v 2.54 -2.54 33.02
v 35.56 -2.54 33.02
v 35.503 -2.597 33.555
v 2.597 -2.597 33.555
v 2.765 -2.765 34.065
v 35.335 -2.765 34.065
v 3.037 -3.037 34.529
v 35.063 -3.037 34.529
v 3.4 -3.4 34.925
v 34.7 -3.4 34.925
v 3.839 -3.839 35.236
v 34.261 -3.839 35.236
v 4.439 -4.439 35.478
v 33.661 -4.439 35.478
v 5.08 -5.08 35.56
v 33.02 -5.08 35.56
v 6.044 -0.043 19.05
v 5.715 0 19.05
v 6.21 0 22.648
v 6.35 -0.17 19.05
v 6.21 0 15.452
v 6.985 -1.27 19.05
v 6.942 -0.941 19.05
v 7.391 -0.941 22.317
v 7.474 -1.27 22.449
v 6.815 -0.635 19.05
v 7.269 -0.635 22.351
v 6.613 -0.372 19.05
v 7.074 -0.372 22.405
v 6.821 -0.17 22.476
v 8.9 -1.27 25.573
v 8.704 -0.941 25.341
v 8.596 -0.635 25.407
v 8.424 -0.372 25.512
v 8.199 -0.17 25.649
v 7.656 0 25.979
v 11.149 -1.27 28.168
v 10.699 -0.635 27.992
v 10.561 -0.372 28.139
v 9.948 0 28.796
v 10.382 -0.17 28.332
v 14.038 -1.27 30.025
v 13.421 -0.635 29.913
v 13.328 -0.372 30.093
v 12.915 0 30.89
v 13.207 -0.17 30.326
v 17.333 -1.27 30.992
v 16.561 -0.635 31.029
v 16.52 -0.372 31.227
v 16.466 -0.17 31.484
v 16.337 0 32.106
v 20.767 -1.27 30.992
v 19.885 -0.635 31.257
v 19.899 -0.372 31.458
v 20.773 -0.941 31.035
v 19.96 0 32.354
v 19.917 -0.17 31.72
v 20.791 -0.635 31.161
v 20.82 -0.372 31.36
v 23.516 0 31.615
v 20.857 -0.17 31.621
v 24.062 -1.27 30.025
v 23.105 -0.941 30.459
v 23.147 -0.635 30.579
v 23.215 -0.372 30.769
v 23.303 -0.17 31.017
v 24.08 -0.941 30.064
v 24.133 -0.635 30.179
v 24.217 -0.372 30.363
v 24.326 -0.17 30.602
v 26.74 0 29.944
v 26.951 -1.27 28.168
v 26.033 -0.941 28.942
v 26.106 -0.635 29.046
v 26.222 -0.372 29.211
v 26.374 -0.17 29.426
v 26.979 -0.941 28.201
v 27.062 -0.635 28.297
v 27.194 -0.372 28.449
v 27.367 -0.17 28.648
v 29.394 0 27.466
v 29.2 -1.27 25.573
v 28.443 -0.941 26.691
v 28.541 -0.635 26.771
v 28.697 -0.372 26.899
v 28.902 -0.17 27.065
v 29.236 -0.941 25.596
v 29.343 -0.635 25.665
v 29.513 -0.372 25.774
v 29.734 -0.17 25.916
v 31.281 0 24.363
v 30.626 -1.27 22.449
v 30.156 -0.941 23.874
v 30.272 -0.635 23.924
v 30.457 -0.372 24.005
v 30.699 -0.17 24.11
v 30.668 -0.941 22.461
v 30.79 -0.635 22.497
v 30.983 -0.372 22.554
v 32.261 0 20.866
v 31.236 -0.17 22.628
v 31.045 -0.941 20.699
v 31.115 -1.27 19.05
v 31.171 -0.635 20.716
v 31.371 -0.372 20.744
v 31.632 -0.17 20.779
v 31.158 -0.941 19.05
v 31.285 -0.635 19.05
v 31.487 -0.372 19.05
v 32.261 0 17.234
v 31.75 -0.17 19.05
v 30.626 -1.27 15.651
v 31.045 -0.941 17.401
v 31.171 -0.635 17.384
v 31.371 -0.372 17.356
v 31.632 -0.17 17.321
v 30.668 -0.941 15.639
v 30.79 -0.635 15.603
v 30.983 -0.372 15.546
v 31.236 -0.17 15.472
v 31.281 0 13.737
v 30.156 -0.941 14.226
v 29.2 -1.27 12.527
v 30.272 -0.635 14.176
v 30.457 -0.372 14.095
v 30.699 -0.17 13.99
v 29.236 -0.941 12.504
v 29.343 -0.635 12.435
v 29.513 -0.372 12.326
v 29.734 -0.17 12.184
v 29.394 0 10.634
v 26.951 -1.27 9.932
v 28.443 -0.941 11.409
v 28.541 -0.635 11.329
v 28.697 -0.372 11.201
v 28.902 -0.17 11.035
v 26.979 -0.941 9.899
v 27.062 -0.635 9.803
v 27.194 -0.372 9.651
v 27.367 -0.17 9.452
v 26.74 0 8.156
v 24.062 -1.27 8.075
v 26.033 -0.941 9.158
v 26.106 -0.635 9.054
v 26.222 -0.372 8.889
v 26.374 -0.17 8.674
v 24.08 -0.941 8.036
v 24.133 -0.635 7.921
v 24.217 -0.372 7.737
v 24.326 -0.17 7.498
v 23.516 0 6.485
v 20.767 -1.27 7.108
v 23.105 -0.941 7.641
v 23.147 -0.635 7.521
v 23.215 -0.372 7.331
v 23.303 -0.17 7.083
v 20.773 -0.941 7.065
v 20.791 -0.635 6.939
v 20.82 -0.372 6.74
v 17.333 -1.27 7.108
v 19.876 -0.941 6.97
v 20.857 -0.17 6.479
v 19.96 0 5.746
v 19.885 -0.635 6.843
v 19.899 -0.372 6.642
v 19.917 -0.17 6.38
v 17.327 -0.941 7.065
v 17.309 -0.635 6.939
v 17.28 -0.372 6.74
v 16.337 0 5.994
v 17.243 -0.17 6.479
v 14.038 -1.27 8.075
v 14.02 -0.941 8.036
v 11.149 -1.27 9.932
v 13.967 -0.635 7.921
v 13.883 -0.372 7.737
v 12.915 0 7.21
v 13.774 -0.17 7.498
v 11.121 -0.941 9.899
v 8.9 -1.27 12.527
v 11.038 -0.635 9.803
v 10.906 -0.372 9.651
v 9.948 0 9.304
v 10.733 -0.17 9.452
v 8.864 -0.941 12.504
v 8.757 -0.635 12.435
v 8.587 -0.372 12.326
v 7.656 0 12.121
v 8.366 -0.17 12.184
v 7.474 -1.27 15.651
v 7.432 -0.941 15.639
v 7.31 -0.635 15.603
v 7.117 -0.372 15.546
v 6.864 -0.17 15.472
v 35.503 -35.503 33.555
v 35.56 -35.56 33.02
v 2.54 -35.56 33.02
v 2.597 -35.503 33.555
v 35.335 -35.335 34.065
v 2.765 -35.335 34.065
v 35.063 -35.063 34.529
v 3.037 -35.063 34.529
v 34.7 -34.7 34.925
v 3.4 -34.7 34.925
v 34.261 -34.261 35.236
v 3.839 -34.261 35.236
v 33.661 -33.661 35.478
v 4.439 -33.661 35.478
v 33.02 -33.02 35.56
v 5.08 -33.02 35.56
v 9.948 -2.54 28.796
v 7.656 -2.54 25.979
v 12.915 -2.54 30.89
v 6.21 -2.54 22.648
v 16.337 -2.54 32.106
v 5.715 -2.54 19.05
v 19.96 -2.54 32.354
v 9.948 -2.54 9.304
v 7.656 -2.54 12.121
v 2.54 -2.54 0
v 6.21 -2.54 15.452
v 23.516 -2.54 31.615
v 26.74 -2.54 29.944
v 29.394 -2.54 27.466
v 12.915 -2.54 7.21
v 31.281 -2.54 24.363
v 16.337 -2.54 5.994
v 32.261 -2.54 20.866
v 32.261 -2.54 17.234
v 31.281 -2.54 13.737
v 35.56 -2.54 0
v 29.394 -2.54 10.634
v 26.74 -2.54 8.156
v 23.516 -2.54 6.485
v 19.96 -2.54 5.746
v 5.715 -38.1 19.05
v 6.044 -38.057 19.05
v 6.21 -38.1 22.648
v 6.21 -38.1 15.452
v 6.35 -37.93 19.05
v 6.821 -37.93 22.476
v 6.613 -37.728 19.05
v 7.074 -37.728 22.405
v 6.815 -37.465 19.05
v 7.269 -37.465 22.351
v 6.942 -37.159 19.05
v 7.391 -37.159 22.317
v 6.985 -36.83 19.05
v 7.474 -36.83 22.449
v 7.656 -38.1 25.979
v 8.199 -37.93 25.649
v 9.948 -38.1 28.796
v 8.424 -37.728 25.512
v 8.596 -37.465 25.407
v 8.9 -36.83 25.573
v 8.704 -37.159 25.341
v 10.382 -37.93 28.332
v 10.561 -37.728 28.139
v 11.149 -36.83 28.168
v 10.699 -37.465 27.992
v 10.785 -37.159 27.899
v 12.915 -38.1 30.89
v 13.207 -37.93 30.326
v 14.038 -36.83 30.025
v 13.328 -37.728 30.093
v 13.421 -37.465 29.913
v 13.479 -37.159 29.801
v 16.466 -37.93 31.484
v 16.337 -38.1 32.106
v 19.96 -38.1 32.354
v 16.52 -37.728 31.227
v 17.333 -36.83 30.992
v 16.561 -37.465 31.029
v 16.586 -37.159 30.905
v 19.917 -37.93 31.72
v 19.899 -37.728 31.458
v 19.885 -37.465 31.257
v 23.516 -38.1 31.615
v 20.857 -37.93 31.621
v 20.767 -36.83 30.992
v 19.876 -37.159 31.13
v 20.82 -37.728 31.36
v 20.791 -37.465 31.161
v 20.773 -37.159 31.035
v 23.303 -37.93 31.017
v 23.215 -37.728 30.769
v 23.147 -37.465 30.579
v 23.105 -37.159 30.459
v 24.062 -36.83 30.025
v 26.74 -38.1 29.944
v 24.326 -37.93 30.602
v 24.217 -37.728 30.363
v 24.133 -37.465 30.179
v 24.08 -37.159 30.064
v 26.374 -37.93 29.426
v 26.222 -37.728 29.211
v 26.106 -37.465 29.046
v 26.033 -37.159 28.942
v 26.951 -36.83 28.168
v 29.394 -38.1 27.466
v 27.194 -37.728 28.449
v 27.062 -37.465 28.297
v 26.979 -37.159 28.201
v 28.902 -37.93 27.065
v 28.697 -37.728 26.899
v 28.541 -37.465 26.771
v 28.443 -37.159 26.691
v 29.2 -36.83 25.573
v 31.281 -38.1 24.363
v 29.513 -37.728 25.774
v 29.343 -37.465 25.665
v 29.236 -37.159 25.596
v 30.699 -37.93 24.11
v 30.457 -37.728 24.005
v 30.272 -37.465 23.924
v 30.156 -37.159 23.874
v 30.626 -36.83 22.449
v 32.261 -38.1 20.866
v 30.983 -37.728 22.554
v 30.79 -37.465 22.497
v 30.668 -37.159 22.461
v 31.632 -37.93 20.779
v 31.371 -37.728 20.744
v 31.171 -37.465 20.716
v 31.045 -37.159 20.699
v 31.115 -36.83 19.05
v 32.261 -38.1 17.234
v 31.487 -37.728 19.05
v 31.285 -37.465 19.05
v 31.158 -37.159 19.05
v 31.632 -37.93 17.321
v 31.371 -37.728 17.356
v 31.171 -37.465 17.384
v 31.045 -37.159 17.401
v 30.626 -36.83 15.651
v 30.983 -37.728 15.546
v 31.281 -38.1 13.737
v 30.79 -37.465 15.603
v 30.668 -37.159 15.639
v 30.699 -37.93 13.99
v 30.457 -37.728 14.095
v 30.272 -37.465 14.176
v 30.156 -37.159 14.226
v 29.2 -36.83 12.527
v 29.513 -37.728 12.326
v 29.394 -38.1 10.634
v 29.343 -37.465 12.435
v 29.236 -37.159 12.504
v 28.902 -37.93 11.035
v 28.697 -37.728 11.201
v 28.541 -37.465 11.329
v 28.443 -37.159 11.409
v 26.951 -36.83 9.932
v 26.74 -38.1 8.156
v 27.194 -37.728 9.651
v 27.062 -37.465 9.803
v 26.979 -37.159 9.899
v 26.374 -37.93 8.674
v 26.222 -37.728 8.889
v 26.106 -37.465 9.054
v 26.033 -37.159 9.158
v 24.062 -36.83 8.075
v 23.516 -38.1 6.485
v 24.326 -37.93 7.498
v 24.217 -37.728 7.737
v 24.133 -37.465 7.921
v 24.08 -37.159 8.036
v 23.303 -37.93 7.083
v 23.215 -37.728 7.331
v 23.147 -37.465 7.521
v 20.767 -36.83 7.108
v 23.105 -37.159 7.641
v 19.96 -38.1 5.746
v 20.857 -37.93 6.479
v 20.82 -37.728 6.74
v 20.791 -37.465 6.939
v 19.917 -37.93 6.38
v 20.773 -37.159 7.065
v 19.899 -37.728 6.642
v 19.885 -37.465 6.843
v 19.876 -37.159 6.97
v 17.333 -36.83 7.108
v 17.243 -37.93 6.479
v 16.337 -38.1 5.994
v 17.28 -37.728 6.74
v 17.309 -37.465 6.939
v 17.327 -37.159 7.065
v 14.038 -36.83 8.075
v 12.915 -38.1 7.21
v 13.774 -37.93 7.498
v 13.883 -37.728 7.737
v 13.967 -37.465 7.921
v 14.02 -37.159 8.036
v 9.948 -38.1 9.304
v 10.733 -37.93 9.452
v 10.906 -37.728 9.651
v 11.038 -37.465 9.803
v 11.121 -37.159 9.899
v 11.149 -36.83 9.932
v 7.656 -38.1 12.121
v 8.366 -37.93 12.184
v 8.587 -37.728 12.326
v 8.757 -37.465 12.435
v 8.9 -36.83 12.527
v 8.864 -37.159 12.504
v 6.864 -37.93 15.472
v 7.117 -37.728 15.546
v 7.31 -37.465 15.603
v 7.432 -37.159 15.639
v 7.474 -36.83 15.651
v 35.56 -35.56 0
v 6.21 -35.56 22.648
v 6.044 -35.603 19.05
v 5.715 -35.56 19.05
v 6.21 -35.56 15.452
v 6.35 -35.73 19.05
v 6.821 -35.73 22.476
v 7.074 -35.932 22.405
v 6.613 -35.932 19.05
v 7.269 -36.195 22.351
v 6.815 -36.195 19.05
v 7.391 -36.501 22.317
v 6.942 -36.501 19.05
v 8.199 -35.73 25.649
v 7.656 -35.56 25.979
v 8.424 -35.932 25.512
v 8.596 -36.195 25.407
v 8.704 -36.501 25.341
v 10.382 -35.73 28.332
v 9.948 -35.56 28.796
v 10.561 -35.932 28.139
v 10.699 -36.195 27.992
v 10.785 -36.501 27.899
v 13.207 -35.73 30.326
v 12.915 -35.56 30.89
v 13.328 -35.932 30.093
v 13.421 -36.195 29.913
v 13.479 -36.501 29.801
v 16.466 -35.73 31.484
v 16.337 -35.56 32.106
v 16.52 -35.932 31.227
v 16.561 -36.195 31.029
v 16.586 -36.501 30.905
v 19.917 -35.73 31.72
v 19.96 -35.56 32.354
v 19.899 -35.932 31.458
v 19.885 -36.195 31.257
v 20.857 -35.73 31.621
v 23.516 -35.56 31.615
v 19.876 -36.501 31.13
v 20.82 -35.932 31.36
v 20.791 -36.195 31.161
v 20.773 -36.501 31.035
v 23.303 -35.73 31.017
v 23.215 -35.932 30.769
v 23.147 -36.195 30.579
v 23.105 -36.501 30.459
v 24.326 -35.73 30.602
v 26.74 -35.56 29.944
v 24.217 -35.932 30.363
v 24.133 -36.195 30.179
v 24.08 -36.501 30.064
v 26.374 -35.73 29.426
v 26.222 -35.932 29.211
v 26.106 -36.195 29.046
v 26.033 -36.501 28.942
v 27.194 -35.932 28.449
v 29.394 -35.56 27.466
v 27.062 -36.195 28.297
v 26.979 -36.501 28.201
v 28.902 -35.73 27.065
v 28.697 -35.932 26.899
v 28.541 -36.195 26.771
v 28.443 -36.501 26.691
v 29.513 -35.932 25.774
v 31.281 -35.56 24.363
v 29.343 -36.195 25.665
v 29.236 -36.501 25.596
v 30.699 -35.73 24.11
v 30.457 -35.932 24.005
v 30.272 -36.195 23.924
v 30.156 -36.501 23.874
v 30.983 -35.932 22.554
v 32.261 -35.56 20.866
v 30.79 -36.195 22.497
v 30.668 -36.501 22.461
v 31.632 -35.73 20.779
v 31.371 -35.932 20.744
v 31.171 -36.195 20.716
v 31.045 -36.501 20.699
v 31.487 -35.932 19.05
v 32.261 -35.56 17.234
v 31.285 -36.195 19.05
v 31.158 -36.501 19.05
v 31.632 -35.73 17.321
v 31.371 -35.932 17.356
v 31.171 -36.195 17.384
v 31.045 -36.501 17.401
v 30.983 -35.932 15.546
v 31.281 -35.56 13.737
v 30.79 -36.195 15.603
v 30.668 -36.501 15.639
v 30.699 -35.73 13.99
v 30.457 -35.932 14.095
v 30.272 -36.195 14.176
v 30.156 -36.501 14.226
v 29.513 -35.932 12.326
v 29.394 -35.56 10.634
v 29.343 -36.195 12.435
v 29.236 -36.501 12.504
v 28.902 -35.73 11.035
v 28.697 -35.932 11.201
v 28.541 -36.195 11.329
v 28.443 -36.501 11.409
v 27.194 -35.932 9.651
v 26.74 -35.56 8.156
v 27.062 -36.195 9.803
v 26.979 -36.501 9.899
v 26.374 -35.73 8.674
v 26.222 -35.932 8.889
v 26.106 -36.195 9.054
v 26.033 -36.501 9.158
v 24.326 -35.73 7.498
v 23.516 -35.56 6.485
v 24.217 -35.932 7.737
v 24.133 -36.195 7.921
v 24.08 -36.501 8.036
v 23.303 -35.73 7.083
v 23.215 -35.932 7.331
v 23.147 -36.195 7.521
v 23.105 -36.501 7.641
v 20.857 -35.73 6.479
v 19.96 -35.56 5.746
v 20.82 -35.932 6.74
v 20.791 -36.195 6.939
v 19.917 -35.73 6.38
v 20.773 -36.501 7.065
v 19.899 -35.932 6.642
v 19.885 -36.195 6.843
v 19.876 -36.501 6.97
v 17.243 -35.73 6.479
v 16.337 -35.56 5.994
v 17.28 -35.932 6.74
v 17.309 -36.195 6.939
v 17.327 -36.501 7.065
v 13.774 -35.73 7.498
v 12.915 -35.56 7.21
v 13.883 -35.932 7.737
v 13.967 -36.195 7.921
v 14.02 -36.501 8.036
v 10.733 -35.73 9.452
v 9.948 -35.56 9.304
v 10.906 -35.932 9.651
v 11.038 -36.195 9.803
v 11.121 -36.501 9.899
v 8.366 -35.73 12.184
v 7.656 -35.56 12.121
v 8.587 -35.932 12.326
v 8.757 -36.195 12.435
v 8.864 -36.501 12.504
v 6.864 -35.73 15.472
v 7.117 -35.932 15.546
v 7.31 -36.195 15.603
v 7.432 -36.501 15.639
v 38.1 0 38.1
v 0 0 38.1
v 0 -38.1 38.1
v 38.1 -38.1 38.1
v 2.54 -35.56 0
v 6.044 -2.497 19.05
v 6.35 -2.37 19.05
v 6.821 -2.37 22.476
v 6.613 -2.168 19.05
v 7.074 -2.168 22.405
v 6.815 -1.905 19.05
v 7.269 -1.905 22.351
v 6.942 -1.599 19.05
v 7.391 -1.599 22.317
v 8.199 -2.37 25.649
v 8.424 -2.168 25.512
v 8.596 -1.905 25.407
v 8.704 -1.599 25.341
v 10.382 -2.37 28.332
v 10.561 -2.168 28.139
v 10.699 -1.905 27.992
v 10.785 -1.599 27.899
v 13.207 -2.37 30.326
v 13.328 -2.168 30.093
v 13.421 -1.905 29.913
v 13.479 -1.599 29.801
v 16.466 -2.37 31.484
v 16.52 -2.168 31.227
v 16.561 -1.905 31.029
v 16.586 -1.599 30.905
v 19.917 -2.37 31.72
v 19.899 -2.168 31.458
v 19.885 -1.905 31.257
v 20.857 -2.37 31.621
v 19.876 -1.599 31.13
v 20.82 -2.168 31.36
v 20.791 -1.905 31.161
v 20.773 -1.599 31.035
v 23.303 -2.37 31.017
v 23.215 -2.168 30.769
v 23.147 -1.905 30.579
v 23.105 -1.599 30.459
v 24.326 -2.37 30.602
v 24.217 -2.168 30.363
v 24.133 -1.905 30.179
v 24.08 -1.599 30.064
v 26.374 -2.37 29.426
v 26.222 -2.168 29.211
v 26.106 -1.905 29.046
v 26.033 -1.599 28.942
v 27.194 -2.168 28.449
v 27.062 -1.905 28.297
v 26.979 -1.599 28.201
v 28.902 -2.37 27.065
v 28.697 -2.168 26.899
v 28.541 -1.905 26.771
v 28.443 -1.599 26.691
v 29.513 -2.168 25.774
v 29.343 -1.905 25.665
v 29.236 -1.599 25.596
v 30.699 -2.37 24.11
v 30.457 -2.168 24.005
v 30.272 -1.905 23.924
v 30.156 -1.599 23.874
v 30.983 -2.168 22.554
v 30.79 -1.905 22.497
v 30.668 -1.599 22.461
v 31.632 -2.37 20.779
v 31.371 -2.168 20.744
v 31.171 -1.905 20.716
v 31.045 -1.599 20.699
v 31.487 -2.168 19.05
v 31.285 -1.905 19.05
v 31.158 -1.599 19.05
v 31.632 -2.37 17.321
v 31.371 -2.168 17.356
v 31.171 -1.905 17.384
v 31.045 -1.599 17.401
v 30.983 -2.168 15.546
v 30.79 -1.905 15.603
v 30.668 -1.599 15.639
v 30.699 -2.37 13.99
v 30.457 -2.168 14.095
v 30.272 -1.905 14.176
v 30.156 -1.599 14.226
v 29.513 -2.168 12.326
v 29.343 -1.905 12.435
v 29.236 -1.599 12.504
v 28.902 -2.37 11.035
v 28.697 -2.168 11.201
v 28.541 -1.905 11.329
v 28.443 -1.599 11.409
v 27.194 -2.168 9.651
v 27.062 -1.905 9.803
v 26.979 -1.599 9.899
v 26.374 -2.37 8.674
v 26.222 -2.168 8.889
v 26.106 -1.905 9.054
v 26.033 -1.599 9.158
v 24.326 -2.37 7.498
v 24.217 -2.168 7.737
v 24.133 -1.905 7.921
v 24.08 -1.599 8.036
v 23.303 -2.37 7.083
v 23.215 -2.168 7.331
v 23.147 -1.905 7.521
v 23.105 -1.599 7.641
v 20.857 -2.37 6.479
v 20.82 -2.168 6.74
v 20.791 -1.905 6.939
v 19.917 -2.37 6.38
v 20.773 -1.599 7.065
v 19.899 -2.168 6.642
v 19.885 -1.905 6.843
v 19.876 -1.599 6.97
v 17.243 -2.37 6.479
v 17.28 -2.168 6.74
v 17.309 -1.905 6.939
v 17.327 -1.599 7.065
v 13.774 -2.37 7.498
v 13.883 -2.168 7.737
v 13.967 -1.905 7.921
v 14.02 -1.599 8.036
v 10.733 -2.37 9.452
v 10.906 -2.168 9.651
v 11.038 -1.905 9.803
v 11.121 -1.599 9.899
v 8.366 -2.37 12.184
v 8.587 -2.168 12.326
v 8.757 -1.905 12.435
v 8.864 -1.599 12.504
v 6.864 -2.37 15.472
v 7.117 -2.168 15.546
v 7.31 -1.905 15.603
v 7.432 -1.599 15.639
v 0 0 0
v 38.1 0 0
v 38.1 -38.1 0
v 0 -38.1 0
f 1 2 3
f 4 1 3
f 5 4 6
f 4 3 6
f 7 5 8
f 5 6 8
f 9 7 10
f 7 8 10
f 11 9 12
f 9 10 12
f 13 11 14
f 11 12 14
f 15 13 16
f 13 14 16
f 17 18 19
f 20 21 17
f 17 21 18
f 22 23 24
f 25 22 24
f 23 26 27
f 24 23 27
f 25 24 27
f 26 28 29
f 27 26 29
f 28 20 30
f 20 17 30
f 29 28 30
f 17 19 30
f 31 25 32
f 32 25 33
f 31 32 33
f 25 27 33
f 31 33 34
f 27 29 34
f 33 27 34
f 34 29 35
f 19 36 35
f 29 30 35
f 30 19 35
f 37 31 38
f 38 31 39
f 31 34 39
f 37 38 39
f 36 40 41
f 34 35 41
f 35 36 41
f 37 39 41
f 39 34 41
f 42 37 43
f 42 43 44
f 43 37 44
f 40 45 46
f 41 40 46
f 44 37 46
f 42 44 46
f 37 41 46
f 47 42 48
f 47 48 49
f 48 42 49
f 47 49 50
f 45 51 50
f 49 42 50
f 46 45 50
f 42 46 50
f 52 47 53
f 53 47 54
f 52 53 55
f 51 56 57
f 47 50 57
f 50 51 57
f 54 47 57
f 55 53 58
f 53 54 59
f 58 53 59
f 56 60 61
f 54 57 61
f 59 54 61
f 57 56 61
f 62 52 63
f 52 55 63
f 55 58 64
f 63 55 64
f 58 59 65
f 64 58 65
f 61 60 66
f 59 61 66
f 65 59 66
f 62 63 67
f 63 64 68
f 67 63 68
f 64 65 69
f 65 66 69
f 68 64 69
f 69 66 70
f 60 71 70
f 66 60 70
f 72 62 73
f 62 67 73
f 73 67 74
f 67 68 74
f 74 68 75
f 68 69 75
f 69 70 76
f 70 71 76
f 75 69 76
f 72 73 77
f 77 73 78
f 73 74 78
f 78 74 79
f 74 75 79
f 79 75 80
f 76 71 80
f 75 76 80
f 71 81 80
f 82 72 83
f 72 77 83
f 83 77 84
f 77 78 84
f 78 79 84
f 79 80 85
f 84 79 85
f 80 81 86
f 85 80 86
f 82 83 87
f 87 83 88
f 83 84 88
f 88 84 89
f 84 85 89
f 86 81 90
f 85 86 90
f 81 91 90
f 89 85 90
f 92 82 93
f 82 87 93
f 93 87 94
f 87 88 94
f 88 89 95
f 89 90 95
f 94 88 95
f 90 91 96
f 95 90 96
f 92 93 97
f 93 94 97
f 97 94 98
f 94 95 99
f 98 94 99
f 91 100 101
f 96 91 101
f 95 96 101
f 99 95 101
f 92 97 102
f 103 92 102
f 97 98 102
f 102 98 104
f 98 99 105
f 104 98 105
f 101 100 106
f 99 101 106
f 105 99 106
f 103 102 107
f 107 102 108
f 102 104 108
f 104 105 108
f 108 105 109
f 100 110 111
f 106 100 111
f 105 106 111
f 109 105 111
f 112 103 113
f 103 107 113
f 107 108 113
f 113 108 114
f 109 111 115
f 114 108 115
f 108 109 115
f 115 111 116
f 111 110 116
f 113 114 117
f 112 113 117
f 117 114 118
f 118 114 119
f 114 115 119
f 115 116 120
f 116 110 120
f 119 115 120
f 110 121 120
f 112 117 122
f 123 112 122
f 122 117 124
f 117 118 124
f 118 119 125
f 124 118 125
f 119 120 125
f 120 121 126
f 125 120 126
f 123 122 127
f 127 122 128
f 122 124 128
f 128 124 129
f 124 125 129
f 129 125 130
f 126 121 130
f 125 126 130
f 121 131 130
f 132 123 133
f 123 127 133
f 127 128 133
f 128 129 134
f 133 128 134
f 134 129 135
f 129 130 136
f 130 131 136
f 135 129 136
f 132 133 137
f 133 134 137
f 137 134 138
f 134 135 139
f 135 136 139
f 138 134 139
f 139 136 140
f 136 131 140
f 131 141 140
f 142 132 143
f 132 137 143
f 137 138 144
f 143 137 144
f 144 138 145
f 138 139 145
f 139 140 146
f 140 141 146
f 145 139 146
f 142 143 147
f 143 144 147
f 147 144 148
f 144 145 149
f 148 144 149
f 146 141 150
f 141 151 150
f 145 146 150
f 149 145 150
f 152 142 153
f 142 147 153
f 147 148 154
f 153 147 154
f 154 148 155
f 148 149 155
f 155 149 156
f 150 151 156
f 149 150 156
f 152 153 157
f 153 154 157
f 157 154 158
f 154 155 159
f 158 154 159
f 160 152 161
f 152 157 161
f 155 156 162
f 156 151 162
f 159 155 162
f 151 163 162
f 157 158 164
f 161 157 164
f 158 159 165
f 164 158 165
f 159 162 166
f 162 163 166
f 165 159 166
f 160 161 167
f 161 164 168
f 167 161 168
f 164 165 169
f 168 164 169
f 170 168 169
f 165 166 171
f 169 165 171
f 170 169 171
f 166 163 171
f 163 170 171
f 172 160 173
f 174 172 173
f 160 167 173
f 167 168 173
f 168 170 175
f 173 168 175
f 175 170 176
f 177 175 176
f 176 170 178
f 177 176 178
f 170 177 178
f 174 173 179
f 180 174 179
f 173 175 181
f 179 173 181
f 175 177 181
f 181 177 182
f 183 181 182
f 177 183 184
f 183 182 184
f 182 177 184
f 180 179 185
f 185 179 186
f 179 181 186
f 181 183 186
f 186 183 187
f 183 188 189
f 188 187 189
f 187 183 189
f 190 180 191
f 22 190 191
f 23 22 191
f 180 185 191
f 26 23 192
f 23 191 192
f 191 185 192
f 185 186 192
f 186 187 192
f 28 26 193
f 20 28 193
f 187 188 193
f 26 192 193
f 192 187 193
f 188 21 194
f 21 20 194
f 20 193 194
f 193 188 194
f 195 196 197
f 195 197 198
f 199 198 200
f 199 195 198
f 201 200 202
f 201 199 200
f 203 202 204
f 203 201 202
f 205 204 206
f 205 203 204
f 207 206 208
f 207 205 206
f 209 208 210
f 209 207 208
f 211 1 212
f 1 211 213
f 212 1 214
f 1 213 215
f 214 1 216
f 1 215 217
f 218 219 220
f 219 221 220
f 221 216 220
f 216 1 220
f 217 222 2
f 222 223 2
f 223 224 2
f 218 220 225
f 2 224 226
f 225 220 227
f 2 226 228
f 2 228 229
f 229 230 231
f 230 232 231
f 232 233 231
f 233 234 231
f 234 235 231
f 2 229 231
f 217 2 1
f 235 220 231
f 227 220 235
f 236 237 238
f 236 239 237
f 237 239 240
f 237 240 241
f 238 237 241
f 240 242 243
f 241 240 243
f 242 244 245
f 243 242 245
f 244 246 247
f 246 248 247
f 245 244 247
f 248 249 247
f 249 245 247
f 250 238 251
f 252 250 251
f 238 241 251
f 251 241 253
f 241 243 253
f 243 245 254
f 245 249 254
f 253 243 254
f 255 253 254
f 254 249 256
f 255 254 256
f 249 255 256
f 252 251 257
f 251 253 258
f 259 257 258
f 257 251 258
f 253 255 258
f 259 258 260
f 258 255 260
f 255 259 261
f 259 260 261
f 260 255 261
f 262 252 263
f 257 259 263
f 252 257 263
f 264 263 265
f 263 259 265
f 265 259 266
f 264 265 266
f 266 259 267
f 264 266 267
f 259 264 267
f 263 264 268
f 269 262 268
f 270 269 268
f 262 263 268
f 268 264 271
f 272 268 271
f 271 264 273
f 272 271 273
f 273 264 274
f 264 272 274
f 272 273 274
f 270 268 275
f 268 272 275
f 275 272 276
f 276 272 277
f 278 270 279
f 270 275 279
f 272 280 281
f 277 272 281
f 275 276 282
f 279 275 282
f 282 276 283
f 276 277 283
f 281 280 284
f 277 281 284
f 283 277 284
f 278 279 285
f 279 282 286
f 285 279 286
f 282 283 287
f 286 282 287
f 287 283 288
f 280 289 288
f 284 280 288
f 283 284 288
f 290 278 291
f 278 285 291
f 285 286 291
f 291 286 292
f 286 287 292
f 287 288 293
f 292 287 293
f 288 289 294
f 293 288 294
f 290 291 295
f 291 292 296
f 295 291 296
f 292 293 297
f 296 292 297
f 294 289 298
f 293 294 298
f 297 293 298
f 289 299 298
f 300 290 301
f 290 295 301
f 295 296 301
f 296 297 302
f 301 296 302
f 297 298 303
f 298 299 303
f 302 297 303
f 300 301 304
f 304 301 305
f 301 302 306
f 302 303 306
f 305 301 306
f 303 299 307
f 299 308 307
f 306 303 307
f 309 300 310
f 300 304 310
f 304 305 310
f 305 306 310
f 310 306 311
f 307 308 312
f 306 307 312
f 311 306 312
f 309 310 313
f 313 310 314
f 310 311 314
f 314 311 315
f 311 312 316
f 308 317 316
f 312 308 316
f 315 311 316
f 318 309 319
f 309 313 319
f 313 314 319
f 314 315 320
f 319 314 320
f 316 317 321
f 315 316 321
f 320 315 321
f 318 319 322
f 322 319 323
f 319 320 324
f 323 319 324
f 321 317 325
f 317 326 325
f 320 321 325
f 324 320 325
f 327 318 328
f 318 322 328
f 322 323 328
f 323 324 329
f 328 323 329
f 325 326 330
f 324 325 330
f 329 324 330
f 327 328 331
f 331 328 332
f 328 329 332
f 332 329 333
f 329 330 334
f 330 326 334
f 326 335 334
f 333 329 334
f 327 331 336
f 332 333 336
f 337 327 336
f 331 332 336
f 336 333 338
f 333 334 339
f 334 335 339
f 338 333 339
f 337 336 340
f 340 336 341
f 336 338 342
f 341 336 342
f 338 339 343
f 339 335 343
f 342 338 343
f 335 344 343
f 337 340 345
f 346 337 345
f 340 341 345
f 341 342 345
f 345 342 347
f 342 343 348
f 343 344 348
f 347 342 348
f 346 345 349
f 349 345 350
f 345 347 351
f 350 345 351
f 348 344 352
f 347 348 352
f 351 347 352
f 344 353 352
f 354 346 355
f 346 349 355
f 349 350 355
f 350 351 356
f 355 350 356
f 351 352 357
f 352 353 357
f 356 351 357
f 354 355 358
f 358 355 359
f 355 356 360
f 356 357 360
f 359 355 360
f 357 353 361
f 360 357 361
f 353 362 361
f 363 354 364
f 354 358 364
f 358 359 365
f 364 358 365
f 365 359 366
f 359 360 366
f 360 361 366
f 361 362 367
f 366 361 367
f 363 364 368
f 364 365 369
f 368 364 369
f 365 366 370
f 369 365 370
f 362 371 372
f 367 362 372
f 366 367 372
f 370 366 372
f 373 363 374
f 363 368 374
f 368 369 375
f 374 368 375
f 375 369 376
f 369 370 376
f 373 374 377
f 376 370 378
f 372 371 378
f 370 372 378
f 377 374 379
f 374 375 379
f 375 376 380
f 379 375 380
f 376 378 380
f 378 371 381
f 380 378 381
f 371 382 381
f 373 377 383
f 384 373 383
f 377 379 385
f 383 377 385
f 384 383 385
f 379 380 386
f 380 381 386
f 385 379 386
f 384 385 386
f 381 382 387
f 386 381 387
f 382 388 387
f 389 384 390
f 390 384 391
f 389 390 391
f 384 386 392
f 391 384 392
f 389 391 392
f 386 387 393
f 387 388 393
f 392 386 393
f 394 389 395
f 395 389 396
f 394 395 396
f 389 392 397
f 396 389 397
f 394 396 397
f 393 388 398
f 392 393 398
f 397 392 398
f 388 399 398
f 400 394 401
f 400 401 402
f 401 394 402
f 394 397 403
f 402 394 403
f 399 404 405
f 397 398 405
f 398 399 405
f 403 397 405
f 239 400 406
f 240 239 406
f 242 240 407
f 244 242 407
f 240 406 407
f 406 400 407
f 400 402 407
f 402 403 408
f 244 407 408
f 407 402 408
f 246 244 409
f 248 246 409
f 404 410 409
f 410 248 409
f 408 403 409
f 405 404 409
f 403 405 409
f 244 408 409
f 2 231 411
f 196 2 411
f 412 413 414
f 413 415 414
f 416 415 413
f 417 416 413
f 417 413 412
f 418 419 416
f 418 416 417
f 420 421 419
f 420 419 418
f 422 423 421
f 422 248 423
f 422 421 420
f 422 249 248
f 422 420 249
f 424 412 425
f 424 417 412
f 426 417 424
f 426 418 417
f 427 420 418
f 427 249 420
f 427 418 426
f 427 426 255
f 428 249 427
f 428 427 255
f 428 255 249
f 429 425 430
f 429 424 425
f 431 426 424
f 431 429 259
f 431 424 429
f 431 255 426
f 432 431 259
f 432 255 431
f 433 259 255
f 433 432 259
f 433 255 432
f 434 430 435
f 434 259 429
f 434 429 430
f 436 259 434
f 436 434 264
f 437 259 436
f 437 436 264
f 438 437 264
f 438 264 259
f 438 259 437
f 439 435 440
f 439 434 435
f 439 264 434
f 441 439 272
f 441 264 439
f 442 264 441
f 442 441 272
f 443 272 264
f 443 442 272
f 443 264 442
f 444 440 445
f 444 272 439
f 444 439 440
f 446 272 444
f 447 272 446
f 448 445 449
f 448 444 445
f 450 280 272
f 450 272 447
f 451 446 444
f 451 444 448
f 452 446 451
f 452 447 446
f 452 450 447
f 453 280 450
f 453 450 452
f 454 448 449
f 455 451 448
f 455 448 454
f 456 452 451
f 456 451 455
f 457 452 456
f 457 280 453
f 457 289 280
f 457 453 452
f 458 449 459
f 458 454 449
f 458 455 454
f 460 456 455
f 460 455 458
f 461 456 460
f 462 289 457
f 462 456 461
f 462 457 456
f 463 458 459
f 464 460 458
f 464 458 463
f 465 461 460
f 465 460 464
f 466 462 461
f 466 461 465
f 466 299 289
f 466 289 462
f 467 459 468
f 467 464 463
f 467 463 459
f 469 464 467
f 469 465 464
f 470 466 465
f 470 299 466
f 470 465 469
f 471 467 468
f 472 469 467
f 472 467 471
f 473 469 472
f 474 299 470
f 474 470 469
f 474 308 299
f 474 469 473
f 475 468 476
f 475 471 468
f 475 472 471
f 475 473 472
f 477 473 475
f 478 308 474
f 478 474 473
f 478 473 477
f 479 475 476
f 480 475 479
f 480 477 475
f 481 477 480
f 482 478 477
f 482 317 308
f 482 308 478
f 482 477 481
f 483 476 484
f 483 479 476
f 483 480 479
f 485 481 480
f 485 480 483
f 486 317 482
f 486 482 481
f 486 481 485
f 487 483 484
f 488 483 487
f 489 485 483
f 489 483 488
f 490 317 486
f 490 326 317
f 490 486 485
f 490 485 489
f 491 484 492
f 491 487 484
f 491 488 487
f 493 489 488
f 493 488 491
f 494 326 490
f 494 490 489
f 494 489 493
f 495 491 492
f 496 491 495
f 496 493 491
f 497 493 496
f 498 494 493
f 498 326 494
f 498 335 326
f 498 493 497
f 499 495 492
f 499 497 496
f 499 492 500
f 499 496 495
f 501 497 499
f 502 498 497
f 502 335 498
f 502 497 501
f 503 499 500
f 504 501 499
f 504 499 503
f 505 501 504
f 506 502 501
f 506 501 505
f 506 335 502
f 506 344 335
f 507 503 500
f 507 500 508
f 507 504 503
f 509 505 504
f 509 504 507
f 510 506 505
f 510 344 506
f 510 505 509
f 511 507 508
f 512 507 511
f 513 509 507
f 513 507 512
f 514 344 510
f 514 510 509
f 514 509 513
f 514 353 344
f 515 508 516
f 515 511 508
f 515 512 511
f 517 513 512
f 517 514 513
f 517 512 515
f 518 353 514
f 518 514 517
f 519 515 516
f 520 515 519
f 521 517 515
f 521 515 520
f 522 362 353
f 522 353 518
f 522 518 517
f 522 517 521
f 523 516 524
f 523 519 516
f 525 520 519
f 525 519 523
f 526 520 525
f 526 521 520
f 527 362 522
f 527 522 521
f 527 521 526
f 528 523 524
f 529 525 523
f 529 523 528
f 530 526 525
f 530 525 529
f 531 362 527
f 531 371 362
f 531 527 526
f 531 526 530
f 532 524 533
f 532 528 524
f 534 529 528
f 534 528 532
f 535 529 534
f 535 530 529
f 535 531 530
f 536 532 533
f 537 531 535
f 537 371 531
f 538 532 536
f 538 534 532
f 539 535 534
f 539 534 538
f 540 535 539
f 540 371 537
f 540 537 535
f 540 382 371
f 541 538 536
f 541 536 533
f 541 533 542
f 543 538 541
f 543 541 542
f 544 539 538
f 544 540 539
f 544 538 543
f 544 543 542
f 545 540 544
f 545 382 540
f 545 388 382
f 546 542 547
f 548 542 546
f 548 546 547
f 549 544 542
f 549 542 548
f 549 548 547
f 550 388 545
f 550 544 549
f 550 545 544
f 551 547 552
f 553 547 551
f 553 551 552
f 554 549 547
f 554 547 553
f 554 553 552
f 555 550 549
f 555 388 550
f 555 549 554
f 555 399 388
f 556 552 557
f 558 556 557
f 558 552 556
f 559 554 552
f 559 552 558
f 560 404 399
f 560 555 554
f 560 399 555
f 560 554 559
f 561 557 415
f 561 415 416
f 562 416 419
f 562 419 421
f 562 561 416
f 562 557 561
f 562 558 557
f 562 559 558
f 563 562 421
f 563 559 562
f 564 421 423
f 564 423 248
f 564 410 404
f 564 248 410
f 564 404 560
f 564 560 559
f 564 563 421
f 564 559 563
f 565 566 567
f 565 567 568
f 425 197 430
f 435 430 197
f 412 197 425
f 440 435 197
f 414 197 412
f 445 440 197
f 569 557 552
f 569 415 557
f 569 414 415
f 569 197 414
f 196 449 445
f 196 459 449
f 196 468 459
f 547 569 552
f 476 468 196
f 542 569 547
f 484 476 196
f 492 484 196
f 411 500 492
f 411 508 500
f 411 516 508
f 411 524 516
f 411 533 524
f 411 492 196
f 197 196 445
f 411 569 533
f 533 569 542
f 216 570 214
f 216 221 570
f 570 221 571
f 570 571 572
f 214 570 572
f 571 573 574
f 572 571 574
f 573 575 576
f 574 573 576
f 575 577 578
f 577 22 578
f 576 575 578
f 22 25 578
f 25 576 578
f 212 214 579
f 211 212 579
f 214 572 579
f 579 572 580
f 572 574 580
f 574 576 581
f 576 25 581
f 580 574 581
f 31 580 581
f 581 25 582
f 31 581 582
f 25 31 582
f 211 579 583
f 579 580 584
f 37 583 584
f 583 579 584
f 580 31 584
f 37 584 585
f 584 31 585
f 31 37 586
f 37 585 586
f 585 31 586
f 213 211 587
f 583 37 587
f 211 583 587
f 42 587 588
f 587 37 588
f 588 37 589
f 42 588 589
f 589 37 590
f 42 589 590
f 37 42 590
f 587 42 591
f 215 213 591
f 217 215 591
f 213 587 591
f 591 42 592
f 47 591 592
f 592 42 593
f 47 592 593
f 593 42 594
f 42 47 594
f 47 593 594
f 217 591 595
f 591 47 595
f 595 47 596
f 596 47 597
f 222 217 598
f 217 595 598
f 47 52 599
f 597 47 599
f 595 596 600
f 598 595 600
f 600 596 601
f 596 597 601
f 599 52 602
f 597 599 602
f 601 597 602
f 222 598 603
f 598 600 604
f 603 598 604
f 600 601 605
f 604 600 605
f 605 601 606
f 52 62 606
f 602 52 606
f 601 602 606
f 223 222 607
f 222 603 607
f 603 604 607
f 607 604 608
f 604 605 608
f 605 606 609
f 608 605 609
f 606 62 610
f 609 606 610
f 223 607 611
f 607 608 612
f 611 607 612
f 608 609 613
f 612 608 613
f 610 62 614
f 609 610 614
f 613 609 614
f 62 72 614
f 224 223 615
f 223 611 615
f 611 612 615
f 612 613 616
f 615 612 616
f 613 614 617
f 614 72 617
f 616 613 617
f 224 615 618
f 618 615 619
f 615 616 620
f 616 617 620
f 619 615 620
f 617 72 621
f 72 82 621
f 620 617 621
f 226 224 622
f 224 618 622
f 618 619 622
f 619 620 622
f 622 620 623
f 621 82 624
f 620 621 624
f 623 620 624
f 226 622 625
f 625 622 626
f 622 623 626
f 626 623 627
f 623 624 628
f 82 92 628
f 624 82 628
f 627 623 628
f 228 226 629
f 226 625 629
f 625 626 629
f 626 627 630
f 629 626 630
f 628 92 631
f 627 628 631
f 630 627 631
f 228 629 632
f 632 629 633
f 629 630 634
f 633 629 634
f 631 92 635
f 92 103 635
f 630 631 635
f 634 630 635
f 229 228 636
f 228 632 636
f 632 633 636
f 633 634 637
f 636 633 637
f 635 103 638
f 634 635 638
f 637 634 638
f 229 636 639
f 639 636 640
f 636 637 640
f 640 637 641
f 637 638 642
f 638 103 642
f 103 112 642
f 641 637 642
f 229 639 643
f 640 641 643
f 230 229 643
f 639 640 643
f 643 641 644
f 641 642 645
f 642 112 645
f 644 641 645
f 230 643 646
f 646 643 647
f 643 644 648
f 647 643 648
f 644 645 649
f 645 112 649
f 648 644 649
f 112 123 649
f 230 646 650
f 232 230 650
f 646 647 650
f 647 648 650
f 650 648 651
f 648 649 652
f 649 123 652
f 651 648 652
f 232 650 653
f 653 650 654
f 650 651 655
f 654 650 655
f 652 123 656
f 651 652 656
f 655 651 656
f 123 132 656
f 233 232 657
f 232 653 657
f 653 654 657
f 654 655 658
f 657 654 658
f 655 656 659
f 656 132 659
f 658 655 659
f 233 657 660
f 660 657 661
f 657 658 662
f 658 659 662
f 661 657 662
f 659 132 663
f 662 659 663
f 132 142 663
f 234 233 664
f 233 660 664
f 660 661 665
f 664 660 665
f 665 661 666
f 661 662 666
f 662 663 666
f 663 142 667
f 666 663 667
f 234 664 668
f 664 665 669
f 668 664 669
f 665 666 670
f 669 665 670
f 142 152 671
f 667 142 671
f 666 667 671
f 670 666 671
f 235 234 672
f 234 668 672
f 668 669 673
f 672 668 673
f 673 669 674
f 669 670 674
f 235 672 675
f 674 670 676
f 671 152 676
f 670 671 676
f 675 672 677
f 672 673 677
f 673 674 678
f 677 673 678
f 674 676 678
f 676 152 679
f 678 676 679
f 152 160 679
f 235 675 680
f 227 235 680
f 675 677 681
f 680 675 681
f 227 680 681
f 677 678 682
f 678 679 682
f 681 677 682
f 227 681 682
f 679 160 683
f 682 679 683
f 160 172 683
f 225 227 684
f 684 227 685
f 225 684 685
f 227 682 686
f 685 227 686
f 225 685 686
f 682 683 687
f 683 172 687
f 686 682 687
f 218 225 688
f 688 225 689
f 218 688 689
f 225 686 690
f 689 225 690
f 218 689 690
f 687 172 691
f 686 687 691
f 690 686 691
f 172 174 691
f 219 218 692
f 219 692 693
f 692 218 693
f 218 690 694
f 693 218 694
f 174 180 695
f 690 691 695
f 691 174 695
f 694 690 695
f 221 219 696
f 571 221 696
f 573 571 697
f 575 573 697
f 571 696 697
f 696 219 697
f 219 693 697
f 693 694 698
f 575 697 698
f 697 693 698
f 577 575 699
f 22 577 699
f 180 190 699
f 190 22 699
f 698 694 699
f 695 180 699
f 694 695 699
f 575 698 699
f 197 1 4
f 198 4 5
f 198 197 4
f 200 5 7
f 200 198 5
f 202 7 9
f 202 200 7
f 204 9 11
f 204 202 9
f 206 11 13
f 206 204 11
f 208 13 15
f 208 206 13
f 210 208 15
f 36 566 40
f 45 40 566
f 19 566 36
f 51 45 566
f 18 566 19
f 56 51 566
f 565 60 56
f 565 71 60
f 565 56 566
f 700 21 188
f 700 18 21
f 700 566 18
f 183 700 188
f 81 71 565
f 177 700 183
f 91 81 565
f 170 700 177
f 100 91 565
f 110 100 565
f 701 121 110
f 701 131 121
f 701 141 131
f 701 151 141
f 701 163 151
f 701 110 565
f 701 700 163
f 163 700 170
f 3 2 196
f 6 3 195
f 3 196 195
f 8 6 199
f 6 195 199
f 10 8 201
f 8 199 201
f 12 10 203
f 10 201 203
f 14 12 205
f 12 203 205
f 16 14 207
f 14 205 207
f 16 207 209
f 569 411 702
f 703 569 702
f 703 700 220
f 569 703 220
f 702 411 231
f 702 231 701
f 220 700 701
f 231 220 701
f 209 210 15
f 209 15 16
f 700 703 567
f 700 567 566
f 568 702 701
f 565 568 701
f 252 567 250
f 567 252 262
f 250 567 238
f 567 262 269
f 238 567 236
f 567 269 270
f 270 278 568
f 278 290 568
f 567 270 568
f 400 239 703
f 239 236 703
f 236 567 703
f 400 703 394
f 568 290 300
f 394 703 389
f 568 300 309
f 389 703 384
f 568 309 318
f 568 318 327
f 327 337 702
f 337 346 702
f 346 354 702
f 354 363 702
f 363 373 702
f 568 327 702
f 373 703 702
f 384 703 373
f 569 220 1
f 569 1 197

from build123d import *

# Parameters (mm, degrees)
F0_W     = 38.1
F0_H     = 38.1
F1_DEPTH = 38.1
F2_W     = 33.02
F2_H     = 33.02
F3_DEPTH = 35.56
F4_R     = 2.54
F5_R     = 12.065
F6_DEPTH = 38.101
F7_R     = 1.26999


# Not quite as in the source:
# - a fillet or chamfer is up to 0.001 mm smaller than in the source, because OpenCascade refuses the exact size


with BuildPart() as f1:
    # F0 (on Top) → F1 (new body)
    with BuildSketch(Plane.XY):
        with Locations((19.05, -19.05)):
            Rectangle(F0_W, F0_H)
    extrude(amount=F1_DEPTH)

    # F2 (on face) → F3 (cut)
    with BuildSketch(Plane(origin=(0, 0, 0), x_dir=(1, 0, 0), z_dir=(0, 0, -1))):
        with Locations((19.05, 19.05)):
            Rectangle(F2_W, F2_H)
    extrude(amount=-F3_DEPTH, mode=Mode.SUBTRACT)

    # F4
    f4_edges = [f1.edges().sort_by_distance(p)[0] for p in [
        (19.05, -35.56, 35.56),
        (2.54, -19.05, 35.56),
        (35.56, -19.05, 35.56),
        (19.05, -2.54, 35.56),
    ]]
    fillet(f4_edges, radius=F4_R)

    # F5 (on face) → F6 (cut, through all)
    with BuildSketch(Plane(origin=(0, 0, 0), x_dir=(-1, 0, 0), z_dir=(0, 1, 0))):
        with Locations((-19.05, 19.05)):
            Circle(F5_R)
    extrude(amount=-F6_DEPTH, mode=Mode.SUBTRACT)

    # F7 (radius 1.27 in the source; OpenCascade refuses exactly that, so slightly less here)
    f7_edges = [f1.edges().sort_by_distance(p)[0] for p in [
        (31.115, 0, 19.05),
        (31.115, -2.54, 19.05),
        (31.115, -35.56, 19.05),
        (31.115, -38.1, 19.05),
    ]]
    fillet(f7_edges, radius=F7_R)


solid = f1.part
